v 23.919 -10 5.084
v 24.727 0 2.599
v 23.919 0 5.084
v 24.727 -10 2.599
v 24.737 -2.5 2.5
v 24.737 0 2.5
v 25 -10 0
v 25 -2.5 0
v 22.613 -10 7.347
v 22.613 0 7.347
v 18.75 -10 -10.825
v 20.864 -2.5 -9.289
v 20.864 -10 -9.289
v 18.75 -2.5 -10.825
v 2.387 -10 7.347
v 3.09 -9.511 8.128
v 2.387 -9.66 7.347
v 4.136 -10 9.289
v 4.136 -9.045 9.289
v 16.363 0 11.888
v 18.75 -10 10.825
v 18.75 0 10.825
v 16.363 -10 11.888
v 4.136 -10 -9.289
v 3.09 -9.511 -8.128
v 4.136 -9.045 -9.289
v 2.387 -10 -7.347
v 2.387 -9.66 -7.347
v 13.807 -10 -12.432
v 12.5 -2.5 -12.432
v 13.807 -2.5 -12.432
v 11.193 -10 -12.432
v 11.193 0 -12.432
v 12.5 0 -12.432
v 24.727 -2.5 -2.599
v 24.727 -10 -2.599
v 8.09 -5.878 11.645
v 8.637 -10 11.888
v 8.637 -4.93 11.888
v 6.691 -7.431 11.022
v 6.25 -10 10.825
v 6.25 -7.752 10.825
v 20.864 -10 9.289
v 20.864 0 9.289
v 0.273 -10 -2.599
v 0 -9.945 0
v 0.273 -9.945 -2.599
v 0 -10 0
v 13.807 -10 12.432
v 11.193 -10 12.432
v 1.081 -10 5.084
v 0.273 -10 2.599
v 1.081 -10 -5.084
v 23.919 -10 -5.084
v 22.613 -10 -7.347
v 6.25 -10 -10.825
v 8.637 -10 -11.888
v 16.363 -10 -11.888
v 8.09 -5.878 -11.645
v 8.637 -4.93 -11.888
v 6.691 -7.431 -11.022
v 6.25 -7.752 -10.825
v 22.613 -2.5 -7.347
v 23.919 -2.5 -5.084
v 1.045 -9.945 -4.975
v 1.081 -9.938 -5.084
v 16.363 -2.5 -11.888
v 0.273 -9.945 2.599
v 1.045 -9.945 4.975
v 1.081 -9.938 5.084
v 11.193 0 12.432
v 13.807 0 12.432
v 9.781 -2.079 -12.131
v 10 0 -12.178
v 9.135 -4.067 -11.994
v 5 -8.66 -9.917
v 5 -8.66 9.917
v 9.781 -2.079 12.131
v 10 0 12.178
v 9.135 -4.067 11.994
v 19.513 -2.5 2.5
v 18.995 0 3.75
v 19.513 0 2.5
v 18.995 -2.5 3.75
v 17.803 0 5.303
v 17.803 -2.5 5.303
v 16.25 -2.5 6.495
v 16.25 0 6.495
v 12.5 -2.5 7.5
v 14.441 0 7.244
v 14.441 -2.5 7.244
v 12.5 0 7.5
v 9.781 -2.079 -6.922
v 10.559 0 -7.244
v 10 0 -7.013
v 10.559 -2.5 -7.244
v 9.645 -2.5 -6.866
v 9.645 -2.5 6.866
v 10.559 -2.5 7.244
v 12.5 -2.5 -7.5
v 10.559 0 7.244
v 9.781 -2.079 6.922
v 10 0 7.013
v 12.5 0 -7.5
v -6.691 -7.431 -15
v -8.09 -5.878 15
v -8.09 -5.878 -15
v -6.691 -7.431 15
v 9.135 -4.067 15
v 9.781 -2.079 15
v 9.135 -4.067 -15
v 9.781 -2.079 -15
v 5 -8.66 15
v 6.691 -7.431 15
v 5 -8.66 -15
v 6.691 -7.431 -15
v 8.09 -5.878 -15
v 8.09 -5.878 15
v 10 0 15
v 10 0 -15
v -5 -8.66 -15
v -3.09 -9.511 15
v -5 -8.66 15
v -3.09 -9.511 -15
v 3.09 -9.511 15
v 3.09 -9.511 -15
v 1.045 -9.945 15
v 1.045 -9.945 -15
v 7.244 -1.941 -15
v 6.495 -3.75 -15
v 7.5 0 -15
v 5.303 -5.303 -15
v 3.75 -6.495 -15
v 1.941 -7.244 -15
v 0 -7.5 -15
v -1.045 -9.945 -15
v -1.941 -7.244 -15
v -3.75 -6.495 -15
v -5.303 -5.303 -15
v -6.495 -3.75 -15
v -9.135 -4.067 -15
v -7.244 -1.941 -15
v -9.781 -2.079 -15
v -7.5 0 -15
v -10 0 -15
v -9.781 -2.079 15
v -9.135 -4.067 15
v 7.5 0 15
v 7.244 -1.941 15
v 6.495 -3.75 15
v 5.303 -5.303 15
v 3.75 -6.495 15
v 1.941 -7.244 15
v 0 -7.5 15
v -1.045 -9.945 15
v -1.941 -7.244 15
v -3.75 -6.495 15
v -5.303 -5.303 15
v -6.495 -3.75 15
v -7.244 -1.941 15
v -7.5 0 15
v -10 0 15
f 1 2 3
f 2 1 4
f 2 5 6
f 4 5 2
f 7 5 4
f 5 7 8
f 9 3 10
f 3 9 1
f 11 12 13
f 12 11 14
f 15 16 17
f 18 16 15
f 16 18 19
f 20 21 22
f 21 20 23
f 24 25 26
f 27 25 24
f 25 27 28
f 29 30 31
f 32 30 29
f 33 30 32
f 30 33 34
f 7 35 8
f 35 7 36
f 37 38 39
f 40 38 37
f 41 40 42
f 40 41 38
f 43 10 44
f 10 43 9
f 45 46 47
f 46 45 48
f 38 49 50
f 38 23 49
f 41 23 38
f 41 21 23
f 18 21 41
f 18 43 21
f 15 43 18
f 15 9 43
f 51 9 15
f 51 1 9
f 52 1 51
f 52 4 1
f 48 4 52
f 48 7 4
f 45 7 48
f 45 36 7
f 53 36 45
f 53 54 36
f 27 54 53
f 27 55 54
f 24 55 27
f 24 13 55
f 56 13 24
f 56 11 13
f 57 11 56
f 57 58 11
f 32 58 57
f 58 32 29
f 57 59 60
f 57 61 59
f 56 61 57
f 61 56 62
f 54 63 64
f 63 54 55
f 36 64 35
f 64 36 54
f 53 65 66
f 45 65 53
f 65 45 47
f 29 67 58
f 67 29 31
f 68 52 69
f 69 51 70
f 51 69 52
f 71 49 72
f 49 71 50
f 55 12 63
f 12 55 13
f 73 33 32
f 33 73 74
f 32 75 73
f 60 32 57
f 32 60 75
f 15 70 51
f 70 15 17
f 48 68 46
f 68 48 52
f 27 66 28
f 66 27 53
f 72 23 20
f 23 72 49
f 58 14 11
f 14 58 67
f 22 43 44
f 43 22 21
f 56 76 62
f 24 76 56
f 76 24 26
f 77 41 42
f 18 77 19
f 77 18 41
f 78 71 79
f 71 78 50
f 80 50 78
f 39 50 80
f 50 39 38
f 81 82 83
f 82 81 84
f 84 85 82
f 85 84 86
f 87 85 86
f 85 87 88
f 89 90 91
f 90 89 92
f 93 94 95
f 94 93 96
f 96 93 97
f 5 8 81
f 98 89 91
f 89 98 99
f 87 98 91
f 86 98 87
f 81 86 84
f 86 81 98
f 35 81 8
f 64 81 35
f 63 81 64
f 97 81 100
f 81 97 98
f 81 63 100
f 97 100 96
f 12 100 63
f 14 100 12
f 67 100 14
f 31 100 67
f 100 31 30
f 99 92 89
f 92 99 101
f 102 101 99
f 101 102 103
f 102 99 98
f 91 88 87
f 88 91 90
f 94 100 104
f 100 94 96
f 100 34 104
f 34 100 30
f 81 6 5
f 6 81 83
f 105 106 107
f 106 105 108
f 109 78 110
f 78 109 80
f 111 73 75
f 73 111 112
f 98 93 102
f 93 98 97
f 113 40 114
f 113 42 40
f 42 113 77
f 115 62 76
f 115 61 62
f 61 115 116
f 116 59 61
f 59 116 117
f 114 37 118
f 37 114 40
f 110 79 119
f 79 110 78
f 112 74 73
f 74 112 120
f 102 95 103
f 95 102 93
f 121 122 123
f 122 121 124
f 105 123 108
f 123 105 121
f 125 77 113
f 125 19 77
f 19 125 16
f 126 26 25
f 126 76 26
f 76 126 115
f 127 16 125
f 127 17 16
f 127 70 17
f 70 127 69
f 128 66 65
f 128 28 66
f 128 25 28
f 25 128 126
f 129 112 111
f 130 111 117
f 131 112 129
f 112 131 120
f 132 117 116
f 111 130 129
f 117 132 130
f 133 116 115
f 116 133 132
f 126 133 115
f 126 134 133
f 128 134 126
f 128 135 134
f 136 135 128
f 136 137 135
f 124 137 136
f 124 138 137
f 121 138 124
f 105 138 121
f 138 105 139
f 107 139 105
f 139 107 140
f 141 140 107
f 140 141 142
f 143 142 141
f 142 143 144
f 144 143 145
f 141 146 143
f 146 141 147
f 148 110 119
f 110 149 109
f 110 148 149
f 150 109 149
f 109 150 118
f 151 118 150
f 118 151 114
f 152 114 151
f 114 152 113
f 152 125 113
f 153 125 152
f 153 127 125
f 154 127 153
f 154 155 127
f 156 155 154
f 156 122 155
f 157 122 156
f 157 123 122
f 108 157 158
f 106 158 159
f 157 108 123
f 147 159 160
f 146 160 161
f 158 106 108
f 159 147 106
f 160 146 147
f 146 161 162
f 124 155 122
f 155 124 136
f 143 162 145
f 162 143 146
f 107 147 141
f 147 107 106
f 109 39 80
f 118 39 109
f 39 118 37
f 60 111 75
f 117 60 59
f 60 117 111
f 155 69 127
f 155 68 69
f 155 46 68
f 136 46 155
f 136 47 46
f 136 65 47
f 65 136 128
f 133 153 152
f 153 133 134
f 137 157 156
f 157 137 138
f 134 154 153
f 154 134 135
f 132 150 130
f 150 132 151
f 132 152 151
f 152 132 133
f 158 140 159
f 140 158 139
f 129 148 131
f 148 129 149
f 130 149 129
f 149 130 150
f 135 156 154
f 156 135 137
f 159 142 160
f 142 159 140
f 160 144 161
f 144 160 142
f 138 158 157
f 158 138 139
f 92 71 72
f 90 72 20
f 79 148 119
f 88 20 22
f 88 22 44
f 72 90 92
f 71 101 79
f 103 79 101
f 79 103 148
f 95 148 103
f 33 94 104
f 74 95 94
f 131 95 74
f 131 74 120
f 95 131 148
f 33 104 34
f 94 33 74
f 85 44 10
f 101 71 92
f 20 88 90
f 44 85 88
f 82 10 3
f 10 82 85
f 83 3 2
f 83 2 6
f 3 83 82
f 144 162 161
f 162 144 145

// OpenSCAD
seat_stay_diameter = 15;
tube_wall_thickness = 5;
outer_diameter = seat_stay_diameter+tube_wall_thickness;

tube_length = 30;

plate_diameter = 25;
slot_diameter = 15;
slot_thickness = 5;

halver = (outer_diameter + plate_diameter) * 2;

module bracket() {
     difference() {
          union() {
               cylinder(h=tube_length, d=outer_diameter, center=true);
               rotate([90, 0, 0]) {
                    translate([plate_diameter/2, 0, 0]) {
                         difference() {
                              cylinder(h=outer_diameter, d=plate_diameter, center=true);
                              cylinder(h=slot_thickness, d=slot_diameter, center=true);
                              translate([0, -plate_diameter/2, -slot_thickness/2]) {
                                   cube([plate_diameter/2, slot_diameter, slot_thickness]);
                              }
                         }
                    }
               }
          }
          cylinder(h=tube_length+2, d=seat_stay_diameter, center=true);
     }
}

difference() {
     bracket();
     translate([-halver/2, 0, -halver/2])
          cube([halver, halver, halver]);
}
